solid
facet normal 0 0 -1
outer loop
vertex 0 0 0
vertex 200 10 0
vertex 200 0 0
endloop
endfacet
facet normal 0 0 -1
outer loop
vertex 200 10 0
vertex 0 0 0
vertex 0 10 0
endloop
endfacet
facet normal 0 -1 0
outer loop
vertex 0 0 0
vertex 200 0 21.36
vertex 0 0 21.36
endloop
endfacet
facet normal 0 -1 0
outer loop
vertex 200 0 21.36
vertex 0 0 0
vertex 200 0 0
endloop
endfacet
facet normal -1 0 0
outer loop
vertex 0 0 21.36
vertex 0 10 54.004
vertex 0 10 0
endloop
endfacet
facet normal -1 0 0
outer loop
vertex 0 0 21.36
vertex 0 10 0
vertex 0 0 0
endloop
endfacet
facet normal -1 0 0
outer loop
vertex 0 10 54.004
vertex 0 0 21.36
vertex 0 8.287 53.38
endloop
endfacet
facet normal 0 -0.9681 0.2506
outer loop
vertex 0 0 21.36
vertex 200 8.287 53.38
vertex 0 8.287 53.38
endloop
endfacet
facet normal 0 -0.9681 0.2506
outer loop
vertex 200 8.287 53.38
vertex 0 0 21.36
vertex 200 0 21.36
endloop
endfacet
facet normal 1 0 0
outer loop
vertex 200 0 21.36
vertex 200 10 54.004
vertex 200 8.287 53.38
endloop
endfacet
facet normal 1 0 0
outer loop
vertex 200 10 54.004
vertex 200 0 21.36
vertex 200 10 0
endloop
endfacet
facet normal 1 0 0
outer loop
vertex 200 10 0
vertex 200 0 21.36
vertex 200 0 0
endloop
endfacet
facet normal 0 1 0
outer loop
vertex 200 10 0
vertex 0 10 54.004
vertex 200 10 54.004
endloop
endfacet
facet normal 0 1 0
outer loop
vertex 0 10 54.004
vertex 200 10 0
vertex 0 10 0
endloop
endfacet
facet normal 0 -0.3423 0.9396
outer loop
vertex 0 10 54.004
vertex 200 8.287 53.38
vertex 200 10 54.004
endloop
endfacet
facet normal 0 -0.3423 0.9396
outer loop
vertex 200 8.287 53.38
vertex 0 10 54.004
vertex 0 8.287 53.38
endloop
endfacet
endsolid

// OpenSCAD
// Higher definition curves
$fs = 0.1;

module createMeniscus(h,radius) // This module creates the shape that needs to be substracted from a cube to make its corners rounded.
difference(){        //This shape is basicly the difference between a quarter of cylinder and a cube
   translate([radius/2+0.1,radius/2+0.1,0]){
      cube([radius+0.2,radius+0.1,h+0.2],center=true);         // All that 0.x numbers are to avoid "ghost boundaries" when substracting
   }

   cylinder(h=h+0.2,r=radius,$fn = 25,center=true);
}


module roundCornersCube(x,y,z,r)  // Now we just substract the shape we have created in the four corners
difference(){
   cube([x,y,z], center=true);

    translate([x/2-r,y/2-r]){  // We move to the first corner (x,y)
      rotate(0){  
         createMeniscus(z,r); // And substract the meniscus
      }
   }
   translate([-x/2+r,y/2-r]){ // To the second corner (-x,y)
      rotate(90){
         createMeniscus(z,r); // But this time we have to rotate the meniscus 90 deg
      }
   }
      translate([-x/2+r,-y/2+r]){ // ... 
      rotate(180){
         createMeniscus(z,r);
      }
   }
      translate([x/2-r,-y/2+r]){
      rotate(270){
         createMeniscus(z,r);
      }
   }
}

usbWidth = 15;
module usb() {
    cube([7, 15, usbWidth], center = true);
}

module usbC() {
    cube([3, 10, 15], center = true);
}

powerWidth = 7;
module power() {
    cylinder(h=14, r=powerWidth/2, center=true);
}

module prism(l, w, h){
    polyhedron(
        points=[[0,0,0], [l,0,0], [l,w,0], [0,w,0], [0,w,h], [l,w,h]],
        faces=[[0,1,2,3],[5,4,3,2],[0,4,5,1],[0,3,4],[5,2,1]]
    );
}

height=125+4;
length=200;
width=20;
border=3;
shift=7.5;
screenYOffset = 3+2;

// Light shading
lsThickness = 3;

module createBox()
    color([0.6, 0.6, 0.6]) union() {
        difference() {
            cube([height, length, width], center = true);
            rotate([0, 0, 90])
                translate([-(length+1)/2, height/2-shift+0.1, -(width+1)/2])
                    prism(length+2, shift, width+1);
        }
        rotate([0, 0, 90])
            translate([-length/2, -height/2-shift, -width/2])
                prism(length, shift, width);
    };

module holes()
{
    holesBorder = 20;
    for (y=[-height/2+holesBorder+10:10:height/2-holesBorder])
        for (x=[-length/2+holesBorder:10:length/2-holesBorder])
            translate([y, x, -width/2+border/2])
                cube([4, 4, border+2], center=true);
    // Memory card access
  //  translate([5, 40, -width/2+border/2])
  //      cube([50, 50, border+2], center=true);
}
    

module lightShader(addToWidth, addToLength) {
    lsWidth = sqrt(width*width + shift*shift) + addToWidth;
    lsLength = length + addToLength;

    // Offset due to the inclination of the case
    lsAngle = atan(shift/width);   
    lsOffset = tan(lsAngle)*lsThickness;

    color([1, 0.5, 0.5])
        rotate([180, 0, 90])
            translate([-lsLength/2, -lsThickness, -lsWidth/2])
                union() {
                    polyhedron(
                        points = [
                            [border,  0,  border - lsOffset ],  //0 *
                            [lsLength - border,  0,  border - lsOffset],  //1 *
                            [lsLength,  lsThickness,  0 ],  //2
                            [0,  lsThickness,  0 ],  //3
                            [border,  0,  lsWidth - border - lsOffset ],  //4 *
                            [lsLength - border,  0,  lsWidth - border - lsOffset],  //5 *
                            [lsLength,  lsThickness,  lsWidth ],  //6
                            [0,  lsThickness,  lsWidth ]   //7
                        ],
                        faces = [
                            [0,1,2,3],  // bottom
                            [4,5,1,0],  // front
                            [7,6,5,4],  // top
                            [5,6,2,1],  // right
                            [6,7,3,2],  // back
                            [7,4,0,3]
                        ]
                    );
                };
};


module case() {
    difference() {
        // Main box
        createBox();

        // Holes
        holes();
        
        // Connectors
        union()
        {
            lsAngle=atan(shift/width);
            pcbHeight = 5-2;
            yPosition = -height/2 + shift + pcbHeight;

            // USB1
            translate([yPosition + 7/2, -25 -usbWidth/2+1-2, -width/2])
                rotate([0, -lsAngle, 0])
                    usb();
            // USB2
            translate([yPosition + 7/2, 25 + usbWidth/2-1, -width/2])
                rotate([0, -lsAngle, 0])
                    usb();
            
            // USB-C
            translate([yPosition + 7/2, -15 + usbWidth/2-1, -width/2])
                rotate([0, -lsAngle, 0])
                    usbC();
            
            // Power
            translate([yPosition + 7/2, 15, -width/2])
                rotate([0, -lsAngle, 0])
                    power();
        }
        
        // Holes for sensors
        union()
        {
            yPosition = -height/2 + 6;
            lsAngle=atan(shift/width);
            // Small hole
            translate([yPosition, 3, width/2])
                rotate([0, -lsAngle, 0])
                    cylinder(h=14, r=0.5, center=true);
            // Big hole
            translate([yPosition, -3, width/2])
                rotate([0, -lsAngle, 0])
                    cylinder(h=14, r=1.5, center=true);
            // Hole for PCB
            translate([-height/2, 0,0])
                cube([50, length - border*2 + 3, width - border*2 + 3], center=true);
        }
        
        // Audio case
        {
            translate([shift, 0, -width/2-0.01-1])
                audioCase(0.5);
        }
    }
};



module audioCase(expand) {
    audioCaseThickness = 2;
    connectorWidth = 100;
    connectorHeight = 20;
    connectorAngle = 45;

    module half()
        translate([-height+connectorHeight+height/2- expand, -length/2 - expand, 0])
            union()
            {
                cube([height - connectorHeight + expand*2, length/2+expand, audioCaseThickness]);
                w1 = (length-connectorWidth+expand*2)/2;
                w2 = w1 - connectorHeight/tan(connectorAngle);
             /*   polyhedron(
                    points = [
                        [0,  0,  0 ],  //0 *
                        [-connectorHeight,  0,  0],  //1 *
                        [-connectorHeight,  w2,  0 ],  //2
                        [0,  w1,  0 ],  //3
                        [0,  0,  1 ],  //0 *
                        [-connectorHeight,  0,  1],  //1 *
                        [-connectorHeight,  w2,  1 ],  //2
                        [0,  w1,  1 ],  //3
                    ],
                    faces = [
                        [0,1,2,3],  // bottom
                        [4,5,1,0],  // front
                        [7,6,5,4],  // top
                        [5,6,2,1],  // right
                        [6,7,3,2],  // back
                        [7,4,0,3]
                    ]
                );*/
            };

    union()
    {
        half();
        mirror([0,1,0])
            half();
    }
};


module base() {
    baseHeight = 10;
    baseTopWidth = sqrt(width*width+shift*shift);
    baseWidth = 60;
    baseLength = length;

    color([0.5, 1, 0.5])
        difference()
        {
                union() {
                    polyhedron(
                        points = [
                            [0,  0,  0],  //0 *
                            [baseLength,  0,  0],  //1 *
                            [baseLength,  baseHeight,  0 ],  //2
                            [0,  baseHeight,  0 ],  //3
                            [0,  0,  baseTopWidth],  //4 *
                            [baseLength,  0,  baseTopWidth],  //5 *
                            [baseLength,  baseHeight,  baseWidth],  //6
                            [0,  baseHeight,  baseWidth]   //7
                        ],
                        faces = [
                            [0,1,2,3],  // bottom
                            [4,5,1,0],  // front
                            [7,6,5,4],  // top
                            [5,6,2,1],  // right
                            [6,7,3,2],  // back
                            [7,4,0,3]
                        ]
                    );
                };
                translate([-1,-1,baseWidth-10])
                    rotate([20,0,0])
                        cube([baseLength * 2, baseHeight * 2, baseTopWidth]);
        };
};

//lightShader(-3, -2);

/*
union()
{
    case();
    difference()
    {
        case();
        maxSize = max(length, width) * 2;
        rotate([0, 180, 0])
            translate([-52.5, -maxSize/2, -maxSize/2])
                cube(maxSize,center=false);
    }

    // hide the inside
    translate([-height/2+width/2, 0, width/2-2])
        cube([width - 2, length - 2, 2], center=true);
    translate([-height/2+width/2+shift, 0, -width/2+2])
        cube([width - 2, length - 2, 2], center=true);
}

difference()
{
    union()
    {
        translate([shift, 0, -width/2-0.01])
           //     scale([10, 0, 0])
            audioCase(-0.5);
    };
 //   holes();
}*/

base();
